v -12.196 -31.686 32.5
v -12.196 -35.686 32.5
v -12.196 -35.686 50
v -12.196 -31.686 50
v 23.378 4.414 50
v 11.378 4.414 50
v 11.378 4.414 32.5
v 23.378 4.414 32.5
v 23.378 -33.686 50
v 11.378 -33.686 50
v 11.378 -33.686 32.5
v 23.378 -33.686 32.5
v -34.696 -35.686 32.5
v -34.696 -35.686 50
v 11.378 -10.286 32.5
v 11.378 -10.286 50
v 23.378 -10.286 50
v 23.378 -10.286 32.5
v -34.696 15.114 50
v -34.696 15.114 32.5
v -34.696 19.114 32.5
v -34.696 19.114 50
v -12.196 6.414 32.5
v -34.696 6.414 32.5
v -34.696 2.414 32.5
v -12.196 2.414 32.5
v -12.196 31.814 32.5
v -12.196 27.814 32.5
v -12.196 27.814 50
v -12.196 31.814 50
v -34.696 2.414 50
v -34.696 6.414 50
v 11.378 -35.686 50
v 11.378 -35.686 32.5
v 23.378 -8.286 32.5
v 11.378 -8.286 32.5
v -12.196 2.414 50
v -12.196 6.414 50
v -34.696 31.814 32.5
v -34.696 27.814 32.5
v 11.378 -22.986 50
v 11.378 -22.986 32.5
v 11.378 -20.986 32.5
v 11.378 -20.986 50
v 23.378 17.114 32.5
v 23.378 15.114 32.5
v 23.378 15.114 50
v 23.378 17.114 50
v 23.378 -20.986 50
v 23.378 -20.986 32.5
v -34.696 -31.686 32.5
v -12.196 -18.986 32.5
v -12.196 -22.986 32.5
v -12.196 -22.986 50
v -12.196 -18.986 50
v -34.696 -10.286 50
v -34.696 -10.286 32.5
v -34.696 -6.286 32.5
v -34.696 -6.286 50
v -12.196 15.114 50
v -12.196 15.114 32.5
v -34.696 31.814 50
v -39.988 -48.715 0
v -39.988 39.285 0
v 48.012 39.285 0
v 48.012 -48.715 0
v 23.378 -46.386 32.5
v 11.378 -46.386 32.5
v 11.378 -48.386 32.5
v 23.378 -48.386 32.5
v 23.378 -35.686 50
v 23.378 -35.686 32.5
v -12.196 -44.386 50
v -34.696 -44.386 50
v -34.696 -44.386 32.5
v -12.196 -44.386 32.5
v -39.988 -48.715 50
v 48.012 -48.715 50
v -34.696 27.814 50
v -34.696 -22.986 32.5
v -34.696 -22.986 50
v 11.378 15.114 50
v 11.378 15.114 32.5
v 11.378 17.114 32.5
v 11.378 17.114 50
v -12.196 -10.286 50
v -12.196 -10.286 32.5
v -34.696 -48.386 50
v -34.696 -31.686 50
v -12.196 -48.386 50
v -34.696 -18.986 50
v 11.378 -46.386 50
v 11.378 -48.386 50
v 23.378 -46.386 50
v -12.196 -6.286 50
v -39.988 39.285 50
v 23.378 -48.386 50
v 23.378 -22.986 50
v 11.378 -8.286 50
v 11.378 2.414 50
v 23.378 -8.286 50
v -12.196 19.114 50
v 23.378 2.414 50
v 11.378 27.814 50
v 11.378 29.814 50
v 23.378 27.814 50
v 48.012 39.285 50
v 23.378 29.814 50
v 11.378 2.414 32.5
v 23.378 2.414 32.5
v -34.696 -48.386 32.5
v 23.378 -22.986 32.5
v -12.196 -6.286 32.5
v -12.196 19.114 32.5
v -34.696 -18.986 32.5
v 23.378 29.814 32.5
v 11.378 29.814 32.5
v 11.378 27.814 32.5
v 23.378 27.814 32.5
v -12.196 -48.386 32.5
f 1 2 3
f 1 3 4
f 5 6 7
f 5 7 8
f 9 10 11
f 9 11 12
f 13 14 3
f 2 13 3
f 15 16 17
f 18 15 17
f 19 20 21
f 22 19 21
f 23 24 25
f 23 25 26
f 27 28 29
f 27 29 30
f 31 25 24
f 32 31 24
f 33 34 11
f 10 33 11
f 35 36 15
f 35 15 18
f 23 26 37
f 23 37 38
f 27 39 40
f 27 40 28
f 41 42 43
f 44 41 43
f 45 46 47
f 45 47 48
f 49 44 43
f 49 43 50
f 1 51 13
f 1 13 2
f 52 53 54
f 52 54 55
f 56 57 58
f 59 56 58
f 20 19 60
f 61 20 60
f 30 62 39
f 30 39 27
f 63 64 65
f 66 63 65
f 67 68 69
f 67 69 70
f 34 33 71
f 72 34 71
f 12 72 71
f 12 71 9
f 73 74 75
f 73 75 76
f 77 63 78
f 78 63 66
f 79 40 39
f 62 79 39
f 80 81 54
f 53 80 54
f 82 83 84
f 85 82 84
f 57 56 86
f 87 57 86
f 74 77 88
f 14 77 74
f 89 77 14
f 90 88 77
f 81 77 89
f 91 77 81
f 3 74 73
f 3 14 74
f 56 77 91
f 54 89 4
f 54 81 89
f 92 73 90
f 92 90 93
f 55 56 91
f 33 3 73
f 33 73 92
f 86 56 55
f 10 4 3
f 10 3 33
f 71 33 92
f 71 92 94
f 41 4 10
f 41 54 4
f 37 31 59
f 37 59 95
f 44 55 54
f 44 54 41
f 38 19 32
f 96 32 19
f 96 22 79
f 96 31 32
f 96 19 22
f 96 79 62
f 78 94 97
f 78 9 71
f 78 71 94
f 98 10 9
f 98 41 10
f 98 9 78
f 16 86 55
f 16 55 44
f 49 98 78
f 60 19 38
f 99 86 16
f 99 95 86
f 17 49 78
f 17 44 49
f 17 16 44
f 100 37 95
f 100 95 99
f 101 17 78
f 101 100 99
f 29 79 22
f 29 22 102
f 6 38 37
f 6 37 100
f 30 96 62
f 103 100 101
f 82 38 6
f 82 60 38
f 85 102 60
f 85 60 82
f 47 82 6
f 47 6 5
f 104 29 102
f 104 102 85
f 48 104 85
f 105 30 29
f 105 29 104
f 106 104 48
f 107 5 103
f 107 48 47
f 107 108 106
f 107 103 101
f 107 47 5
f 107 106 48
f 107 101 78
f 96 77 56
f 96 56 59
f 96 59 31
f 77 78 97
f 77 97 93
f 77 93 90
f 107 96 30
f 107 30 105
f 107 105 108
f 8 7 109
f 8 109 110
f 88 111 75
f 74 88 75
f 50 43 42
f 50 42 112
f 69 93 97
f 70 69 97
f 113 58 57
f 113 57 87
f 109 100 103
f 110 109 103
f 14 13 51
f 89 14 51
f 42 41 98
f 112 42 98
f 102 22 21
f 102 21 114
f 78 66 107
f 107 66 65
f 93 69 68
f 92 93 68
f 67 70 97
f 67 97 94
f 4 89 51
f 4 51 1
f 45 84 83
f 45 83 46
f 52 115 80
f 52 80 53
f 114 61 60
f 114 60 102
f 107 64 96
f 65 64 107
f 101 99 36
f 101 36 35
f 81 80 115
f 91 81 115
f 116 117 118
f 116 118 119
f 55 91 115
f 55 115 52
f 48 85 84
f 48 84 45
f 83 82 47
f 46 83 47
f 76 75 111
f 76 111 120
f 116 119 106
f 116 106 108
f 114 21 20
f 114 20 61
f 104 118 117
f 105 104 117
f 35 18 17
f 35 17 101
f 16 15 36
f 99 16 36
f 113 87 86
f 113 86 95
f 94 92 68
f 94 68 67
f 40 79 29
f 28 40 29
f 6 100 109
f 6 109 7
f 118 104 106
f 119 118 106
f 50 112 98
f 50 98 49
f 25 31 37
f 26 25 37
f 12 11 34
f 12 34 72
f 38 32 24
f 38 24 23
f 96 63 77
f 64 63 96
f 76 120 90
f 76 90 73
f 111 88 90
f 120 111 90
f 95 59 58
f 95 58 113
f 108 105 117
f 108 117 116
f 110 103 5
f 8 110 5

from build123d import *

# Parameters (mm, degrees)
F0_W     = 88
F0_H     = 88
F1_DEPTH = 50
F2_W     = 22.5
F2_H     = 4
F2_W_2   = 12
F2_H_2   = 2
F3_DEPTH = 17.5


with BuildPart() as f1:
    # F0 (on Top) → F1 (new body)
    with BuildSketch(Plane.XY):
        with Locations((4.011764, -4.715418)):
            Rectangle(F0_W, F0_H)
    extrude(amount=F1_DEPTH)

    # F2 (on face) → F3 (cut)
    with BuildSketch(Plane.XY.offset(50)):
        with Locations((-23.445669, 29.813612)):
            Rectangle(F2_W, F2_H)
        with Locations((-23.445669, 17.113612)):
            Rectangle(F2_W, F2_H)
        with Locations((-23.445669, 4.413612)):
            Rectangle(F2_W, F2_H)
        with Locations((-23.445669, -8.286388)):
            Rectangle(F2_W, F2_H)
        with Locations((-23.445669, -20.986388)):
            Rectangle(F2_W, F2_H)
        with Locations((-23.445669, -33.686388)):
            Rectangle(F2_W, F2_H)
        with Locations((-23.445669, -46.386388)):
            Rectangle(F2_W, F2_H)
        with Locations((17.377627, 28.813612)):
            Rectangle(F2_W_2, F2_H_2)
        with Locations((17.377627, 16.113612)):
            Rectangle(F2_W_2, F2_H_2)
        with Locations((17.377627, 3.413612)):
            Rectangle(F2_W_2, F2_H_2)
        with Locations((17.377627, -9.286388)):
            Rectangle(F2_W_2, F2_H_2)
        with Locations((17.377627, -21.986388)):
            Rectangle(F2_W_2, F2_H_2)
        with Locations((17.377627, -34.686388)):
            Rectangle(F2_W_2, F2_H_2)
        with Locations((17.377627, -47.386388)):
            Rectangle(F2_W_2, F2_H_2)
    extrude(amount=-F3_DEPTH, mode=Mode.SUBTRACT)


solid = f1.part
